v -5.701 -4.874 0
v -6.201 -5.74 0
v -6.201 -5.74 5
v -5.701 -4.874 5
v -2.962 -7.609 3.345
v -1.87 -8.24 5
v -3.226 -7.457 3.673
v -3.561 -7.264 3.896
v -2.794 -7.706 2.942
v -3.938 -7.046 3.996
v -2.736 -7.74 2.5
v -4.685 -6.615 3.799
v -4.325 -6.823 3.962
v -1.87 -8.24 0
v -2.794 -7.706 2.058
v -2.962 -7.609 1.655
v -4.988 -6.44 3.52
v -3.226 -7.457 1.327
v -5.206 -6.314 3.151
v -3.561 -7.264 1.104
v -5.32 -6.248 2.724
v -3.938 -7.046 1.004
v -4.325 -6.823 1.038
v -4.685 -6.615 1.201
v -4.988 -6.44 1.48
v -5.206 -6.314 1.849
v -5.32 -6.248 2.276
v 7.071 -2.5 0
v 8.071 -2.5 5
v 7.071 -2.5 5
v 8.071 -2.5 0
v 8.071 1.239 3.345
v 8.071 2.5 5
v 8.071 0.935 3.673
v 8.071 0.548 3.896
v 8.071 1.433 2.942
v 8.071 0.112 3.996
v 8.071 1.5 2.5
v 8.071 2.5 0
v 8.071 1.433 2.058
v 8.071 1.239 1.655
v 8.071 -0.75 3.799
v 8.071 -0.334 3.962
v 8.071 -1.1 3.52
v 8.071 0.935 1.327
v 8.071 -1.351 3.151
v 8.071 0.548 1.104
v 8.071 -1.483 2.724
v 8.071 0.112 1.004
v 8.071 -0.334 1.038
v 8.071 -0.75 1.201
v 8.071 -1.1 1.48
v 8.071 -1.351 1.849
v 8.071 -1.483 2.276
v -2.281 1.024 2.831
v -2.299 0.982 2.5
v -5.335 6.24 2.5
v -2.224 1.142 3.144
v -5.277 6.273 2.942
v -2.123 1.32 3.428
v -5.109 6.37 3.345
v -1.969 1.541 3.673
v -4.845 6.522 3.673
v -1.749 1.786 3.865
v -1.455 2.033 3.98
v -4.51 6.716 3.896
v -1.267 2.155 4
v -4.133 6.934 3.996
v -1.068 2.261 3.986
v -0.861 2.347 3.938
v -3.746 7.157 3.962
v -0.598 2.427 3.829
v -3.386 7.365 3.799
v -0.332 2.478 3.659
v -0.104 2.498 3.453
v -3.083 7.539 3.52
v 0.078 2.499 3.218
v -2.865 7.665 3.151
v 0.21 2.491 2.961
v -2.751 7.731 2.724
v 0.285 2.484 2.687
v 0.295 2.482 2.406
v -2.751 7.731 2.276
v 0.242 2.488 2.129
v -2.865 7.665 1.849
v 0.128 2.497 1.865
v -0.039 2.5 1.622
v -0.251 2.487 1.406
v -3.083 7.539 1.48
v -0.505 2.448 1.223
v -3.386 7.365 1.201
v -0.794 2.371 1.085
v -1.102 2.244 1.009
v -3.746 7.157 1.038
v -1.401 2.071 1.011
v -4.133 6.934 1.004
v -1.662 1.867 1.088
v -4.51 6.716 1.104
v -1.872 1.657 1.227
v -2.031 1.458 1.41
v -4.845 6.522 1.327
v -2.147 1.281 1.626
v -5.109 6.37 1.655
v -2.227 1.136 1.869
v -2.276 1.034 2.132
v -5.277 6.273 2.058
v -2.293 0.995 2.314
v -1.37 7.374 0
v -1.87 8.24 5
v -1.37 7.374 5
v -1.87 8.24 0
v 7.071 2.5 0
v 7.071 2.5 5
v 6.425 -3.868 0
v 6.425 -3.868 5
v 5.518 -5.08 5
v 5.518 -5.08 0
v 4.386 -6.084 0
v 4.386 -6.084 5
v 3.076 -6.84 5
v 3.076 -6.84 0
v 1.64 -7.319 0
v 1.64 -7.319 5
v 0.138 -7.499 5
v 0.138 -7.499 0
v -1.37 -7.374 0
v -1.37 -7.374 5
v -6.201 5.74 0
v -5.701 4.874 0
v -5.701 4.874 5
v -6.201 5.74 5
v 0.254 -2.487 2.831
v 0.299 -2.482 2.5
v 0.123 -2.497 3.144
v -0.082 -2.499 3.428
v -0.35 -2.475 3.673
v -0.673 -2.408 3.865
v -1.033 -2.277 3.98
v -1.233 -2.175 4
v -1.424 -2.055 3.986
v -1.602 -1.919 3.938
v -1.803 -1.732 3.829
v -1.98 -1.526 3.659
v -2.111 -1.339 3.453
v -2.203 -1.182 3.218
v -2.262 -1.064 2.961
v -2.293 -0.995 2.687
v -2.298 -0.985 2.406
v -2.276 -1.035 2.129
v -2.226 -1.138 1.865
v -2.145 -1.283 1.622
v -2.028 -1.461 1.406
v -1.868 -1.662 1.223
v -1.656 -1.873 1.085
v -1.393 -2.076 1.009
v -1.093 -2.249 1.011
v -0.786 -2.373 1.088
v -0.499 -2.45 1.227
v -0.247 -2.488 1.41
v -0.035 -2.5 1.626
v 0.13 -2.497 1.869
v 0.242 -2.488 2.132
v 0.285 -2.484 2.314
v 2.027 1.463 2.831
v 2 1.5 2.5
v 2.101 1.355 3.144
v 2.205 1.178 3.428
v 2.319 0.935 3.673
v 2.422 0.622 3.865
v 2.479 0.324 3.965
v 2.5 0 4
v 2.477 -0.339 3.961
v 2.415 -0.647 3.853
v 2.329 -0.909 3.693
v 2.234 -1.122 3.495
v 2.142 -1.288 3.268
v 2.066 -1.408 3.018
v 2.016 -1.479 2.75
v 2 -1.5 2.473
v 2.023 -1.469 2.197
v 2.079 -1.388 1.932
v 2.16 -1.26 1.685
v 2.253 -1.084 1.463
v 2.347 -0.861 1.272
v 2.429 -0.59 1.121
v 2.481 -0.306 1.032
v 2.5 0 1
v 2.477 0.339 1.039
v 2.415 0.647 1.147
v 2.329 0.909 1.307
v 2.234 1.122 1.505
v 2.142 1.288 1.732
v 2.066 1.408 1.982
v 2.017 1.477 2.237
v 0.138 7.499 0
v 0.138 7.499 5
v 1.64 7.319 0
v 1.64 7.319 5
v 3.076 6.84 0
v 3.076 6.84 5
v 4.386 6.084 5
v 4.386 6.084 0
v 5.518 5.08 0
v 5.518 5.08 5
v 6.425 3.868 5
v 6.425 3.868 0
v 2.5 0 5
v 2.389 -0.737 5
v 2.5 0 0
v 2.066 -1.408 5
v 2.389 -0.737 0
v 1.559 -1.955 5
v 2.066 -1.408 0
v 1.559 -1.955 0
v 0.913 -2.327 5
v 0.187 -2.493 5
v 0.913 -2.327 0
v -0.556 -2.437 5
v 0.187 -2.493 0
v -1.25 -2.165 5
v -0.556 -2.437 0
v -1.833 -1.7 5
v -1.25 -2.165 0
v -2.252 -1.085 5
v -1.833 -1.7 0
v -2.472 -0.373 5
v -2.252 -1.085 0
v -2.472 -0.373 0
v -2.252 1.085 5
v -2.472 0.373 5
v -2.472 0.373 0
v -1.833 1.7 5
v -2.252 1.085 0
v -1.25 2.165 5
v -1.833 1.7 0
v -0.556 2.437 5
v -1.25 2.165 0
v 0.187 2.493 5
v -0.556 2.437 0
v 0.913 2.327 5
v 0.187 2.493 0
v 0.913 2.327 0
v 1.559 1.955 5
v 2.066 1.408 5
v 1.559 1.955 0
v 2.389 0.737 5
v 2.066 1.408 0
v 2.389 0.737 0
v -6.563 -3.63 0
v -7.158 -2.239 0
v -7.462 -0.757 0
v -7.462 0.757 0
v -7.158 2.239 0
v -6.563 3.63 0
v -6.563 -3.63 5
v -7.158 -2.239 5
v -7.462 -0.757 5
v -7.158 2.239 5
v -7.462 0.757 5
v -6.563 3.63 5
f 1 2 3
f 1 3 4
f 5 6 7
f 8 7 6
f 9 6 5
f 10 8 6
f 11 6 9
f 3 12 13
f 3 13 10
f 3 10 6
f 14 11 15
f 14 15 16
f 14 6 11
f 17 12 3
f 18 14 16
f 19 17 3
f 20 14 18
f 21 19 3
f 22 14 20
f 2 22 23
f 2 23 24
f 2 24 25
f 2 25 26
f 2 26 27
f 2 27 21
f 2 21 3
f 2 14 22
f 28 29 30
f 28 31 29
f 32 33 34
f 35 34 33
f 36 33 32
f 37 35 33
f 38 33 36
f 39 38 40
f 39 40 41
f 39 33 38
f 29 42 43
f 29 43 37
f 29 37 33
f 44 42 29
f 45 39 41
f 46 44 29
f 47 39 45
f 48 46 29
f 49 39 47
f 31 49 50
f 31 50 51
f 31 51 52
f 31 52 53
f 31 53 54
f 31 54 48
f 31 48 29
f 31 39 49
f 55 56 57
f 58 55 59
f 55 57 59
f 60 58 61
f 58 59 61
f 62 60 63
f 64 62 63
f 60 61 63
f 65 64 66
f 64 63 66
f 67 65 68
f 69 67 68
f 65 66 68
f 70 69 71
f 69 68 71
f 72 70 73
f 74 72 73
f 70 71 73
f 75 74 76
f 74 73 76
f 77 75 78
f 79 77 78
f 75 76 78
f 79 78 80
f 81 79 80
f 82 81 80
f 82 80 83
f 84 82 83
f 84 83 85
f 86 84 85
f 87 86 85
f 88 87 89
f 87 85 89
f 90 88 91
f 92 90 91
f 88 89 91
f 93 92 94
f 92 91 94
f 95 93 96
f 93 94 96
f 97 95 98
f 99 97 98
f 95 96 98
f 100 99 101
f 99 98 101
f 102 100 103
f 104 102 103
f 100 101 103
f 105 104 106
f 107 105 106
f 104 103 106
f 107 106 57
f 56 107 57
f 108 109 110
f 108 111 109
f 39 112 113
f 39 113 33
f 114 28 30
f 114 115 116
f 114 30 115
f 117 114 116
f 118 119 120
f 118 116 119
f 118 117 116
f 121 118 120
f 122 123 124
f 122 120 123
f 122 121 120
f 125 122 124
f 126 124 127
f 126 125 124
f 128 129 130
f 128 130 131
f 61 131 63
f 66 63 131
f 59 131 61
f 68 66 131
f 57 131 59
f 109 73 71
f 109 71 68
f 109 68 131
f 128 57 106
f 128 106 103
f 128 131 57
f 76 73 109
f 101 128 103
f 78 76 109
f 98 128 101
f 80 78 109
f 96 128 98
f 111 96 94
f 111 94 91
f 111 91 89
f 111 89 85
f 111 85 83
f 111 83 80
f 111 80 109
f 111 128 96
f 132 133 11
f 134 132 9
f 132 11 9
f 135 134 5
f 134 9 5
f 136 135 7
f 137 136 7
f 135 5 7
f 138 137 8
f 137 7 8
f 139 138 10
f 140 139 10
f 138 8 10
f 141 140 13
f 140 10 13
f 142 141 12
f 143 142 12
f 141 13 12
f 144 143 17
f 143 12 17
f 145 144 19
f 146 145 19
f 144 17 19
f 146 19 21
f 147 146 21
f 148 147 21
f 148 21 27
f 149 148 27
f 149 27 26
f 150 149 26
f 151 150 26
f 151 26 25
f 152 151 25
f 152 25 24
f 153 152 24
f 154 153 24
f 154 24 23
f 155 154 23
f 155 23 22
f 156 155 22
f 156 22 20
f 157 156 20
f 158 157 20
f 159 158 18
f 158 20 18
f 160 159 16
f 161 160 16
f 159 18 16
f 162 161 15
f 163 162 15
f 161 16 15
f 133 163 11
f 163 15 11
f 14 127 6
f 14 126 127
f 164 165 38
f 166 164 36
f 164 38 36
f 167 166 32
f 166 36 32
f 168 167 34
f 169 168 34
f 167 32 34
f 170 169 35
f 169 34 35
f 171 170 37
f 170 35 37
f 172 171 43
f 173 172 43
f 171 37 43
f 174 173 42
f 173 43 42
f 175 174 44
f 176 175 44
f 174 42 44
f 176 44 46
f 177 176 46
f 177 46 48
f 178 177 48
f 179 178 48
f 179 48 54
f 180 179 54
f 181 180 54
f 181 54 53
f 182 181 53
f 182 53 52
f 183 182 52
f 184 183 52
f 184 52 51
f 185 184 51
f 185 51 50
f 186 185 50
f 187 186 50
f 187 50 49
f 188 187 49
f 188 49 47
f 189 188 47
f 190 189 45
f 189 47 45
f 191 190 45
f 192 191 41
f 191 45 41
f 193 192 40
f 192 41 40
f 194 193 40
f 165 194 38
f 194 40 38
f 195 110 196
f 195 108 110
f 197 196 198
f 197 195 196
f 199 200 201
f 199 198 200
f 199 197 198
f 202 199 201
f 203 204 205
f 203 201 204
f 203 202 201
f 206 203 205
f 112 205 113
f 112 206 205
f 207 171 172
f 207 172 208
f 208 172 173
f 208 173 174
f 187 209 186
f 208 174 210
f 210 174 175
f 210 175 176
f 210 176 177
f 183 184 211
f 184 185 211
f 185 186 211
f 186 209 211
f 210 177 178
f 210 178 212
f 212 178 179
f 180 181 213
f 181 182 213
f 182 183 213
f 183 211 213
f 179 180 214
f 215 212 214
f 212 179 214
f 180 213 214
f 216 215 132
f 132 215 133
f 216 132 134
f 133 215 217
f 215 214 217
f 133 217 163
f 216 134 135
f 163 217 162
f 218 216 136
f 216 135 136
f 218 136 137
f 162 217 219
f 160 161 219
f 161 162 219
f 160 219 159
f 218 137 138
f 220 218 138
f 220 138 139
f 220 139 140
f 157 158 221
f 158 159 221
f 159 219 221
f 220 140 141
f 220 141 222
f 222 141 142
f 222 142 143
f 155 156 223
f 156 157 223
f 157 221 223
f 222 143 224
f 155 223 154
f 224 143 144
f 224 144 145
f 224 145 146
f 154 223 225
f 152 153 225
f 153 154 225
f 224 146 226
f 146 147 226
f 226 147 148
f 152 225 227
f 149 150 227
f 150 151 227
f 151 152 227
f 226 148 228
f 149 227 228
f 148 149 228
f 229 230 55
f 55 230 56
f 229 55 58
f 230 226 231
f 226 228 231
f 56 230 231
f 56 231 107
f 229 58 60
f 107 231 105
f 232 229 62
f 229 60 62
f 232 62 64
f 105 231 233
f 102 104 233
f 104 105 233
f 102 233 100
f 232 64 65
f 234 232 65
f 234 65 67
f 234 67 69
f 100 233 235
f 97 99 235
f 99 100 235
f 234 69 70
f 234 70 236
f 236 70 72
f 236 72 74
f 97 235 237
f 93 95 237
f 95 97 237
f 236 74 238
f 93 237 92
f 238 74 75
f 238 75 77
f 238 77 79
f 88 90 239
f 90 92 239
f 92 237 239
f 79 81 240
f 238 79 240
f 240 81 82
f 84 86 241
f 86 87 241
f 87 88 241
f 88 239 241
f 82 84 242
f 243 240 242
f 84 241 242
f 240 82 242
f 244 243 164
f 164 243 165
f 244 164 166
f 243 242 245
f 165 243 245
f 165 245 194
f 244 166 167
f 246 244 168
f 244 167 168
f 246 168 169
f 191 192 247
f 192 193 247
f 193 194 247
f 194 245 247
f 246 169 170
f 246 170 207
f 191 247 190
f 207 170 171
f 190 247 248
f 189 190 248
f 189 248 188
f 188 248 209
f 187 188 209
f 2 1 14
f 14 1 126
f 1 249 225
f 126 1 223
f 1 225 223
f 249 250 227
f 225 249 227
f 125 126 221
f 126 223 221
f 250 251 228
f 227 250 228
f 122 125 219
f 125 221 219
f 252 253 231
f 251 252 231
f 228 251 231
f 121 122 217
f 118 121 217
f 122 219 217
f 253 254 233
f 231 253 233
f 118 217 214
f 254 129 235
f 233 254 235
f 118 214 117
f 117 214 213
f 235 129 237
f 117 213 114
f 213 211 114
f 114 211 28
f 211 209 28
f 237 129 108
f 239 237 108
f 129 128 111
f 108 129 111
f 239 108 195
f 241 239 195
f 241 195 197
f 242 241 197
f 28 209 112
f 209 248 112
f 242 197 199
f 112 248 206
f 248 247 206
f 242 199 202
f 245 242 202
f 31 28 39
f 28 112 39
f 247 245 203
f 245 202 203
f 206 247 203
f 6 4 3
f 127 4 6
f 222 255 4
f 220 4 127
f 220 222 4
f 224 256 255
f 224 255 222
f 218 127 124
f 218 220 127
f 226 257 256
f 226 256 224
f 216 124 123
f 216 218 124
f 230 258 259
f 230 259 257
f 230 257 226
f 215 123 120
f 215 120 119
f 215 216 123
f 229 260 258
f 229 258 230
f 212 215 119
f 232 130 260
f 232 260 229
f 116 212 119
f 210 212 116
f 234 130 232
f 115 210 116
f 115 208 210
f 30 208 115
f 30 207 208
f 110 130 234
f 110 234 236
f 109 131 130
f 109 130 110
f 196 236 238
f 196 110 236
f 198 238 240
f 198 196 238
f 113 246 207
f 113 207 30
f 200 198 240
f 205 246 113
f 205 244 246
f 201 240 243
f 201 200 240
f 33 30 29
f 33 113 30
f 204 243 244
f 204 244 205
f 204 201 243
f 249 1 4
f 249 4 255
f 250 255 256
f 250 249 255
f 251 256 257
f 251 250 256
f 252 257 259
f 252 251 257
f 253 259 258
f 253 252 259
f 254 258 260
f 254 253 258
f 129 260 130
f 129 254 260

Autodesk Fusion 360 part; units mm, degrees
sketch "Boceto1" plane through (0, 0, 0) normal (0, 0, 1) x (1, 0, 0)
  circle A0 centre (0, 0) radius 2.5
  circle A1 centre (0, 0) radius 7.5
  line L0 (0, 2.5) -> (7.0711, 2.5)
  line L1 (0, -2.5) -> (7.0711, -2.5)
  line L2 (7.0711, 2.5) -> (7.0711, -2.5)
  line L3 (7.0711, 2.5) -> (8.0711, 2.5)
  line L4 (8.0711, 2.5) -> (8.0711, -2.5)
  line L5 (8.0711, -2.5) -> (7.0711, -2.5)
  line L6 (-6.2006, 5.7397) -> (-1.8705, 8.2397)
  line L7 (-5.7006, 4.8737) -> (-6.2006, 5.7397)
  line L8 (-1.8705, 8.2397) -> (-1.3705, 7.3737)
  line L9 (-1.8705, -8.2397) -> (-6.2006, -5.7397)
  line L10 (-1.3705, -7.3737) -> (-1.8705, -8.2397)
  line L11 (-6.2006, -5.7397) -> (-5.7006, -4.8737)
  dimension "d1" = 5
  dimension "d2" = 15
  dimension "d3" = 1
  dimension "d5" = 360
extrude "Extruir1" add sketch "Boceto1" along normal blind 5 contours A0 L0 L1 L2 | A0 A1 L0 L1 | A1 L3 L4 L5 | A1 L2 | A1 L6 L7 L8 | A1 L9 L10 L11
sketch "Boceto2" plane through (-4.0355, -6.9897, 0) normal (-0.5, -0.866, 0) x (0.866, -0.5, 0)
  line L0 (-2.5, 0) -> (2.5, 0)
  line L1 (2.5, 0) -> (2.5, 5)
  line L2 (2.5, 5) -> (-2.5, 5)
  line L3 (-2.5, 5) -> (-2.5, 0)
  line L4 (-2.5, 5) -> (2.5, 0)
  line L5 (2.5, 5) -> (-2.5, 0)
  circle A0 centre (0, 2.5) radius 1.5
  dimension "d8" = 3
sketch "Boceto3" plane through (8.0711, 0, 0) normal (1, 0, 0) x (0, 1, 0)
  line L0 (-2.5, 0) -> (2.5, 0)
  line L1 (2.5, 0) -> (2.5, 5)
  line L2 (2.5, 5) -> (-2.5, 5)
  line L3 (-2.5, 5) -> (-2.5, 0)
  line L4 (-2.5, 5) -> (2.5, 0)
  line L5 (2.5, 5) -> (-2.5, 0)
  circle A0 centre (0, 2.5) radius 1.5
  dimension "d9" = 3
sketch "Boceto4" plane through (-4.0355, 6.9897, 0) normal (-0.5, 0.866, 0) x (-0.866, -0.5, 0)
  line L0 (-2.5, 0) -> (2.5, 0)
  line L1 (2.5, 0) -> (2.5, 5)
  line L2 (2.5, 5) -> (-2.5, 5)
  line L3 (-2.5, 5) -> (-2.5, 0)
  line L4 (2.5, 5) -> (-2.5, 0)
  line L5 (-2.5, 5) -> (2.5, 0)
  circle A0 centre (0, 2.5) radius 1.5
  dimension "d10" = 3
extrude "Extruir2" cut sketch "Boceto4" against normal blind 8 contours L4 L5 A0 | L4 L5 A0 | L4 L5 A0 | L4 L5 A0
extrude "Extruir3" cut sketch "Boceto2" against normal blind 8 contours L4 L5 A0 | L4 L5 A0 | L4 L5 A0 | L4 L5 A0
extrude "Extruir4" cut sketch "Boceto3" against normal blind 8 contours L4 L5 A0 | L4 L5 A0 | L4 L5 A0 | L4 L5 A0
